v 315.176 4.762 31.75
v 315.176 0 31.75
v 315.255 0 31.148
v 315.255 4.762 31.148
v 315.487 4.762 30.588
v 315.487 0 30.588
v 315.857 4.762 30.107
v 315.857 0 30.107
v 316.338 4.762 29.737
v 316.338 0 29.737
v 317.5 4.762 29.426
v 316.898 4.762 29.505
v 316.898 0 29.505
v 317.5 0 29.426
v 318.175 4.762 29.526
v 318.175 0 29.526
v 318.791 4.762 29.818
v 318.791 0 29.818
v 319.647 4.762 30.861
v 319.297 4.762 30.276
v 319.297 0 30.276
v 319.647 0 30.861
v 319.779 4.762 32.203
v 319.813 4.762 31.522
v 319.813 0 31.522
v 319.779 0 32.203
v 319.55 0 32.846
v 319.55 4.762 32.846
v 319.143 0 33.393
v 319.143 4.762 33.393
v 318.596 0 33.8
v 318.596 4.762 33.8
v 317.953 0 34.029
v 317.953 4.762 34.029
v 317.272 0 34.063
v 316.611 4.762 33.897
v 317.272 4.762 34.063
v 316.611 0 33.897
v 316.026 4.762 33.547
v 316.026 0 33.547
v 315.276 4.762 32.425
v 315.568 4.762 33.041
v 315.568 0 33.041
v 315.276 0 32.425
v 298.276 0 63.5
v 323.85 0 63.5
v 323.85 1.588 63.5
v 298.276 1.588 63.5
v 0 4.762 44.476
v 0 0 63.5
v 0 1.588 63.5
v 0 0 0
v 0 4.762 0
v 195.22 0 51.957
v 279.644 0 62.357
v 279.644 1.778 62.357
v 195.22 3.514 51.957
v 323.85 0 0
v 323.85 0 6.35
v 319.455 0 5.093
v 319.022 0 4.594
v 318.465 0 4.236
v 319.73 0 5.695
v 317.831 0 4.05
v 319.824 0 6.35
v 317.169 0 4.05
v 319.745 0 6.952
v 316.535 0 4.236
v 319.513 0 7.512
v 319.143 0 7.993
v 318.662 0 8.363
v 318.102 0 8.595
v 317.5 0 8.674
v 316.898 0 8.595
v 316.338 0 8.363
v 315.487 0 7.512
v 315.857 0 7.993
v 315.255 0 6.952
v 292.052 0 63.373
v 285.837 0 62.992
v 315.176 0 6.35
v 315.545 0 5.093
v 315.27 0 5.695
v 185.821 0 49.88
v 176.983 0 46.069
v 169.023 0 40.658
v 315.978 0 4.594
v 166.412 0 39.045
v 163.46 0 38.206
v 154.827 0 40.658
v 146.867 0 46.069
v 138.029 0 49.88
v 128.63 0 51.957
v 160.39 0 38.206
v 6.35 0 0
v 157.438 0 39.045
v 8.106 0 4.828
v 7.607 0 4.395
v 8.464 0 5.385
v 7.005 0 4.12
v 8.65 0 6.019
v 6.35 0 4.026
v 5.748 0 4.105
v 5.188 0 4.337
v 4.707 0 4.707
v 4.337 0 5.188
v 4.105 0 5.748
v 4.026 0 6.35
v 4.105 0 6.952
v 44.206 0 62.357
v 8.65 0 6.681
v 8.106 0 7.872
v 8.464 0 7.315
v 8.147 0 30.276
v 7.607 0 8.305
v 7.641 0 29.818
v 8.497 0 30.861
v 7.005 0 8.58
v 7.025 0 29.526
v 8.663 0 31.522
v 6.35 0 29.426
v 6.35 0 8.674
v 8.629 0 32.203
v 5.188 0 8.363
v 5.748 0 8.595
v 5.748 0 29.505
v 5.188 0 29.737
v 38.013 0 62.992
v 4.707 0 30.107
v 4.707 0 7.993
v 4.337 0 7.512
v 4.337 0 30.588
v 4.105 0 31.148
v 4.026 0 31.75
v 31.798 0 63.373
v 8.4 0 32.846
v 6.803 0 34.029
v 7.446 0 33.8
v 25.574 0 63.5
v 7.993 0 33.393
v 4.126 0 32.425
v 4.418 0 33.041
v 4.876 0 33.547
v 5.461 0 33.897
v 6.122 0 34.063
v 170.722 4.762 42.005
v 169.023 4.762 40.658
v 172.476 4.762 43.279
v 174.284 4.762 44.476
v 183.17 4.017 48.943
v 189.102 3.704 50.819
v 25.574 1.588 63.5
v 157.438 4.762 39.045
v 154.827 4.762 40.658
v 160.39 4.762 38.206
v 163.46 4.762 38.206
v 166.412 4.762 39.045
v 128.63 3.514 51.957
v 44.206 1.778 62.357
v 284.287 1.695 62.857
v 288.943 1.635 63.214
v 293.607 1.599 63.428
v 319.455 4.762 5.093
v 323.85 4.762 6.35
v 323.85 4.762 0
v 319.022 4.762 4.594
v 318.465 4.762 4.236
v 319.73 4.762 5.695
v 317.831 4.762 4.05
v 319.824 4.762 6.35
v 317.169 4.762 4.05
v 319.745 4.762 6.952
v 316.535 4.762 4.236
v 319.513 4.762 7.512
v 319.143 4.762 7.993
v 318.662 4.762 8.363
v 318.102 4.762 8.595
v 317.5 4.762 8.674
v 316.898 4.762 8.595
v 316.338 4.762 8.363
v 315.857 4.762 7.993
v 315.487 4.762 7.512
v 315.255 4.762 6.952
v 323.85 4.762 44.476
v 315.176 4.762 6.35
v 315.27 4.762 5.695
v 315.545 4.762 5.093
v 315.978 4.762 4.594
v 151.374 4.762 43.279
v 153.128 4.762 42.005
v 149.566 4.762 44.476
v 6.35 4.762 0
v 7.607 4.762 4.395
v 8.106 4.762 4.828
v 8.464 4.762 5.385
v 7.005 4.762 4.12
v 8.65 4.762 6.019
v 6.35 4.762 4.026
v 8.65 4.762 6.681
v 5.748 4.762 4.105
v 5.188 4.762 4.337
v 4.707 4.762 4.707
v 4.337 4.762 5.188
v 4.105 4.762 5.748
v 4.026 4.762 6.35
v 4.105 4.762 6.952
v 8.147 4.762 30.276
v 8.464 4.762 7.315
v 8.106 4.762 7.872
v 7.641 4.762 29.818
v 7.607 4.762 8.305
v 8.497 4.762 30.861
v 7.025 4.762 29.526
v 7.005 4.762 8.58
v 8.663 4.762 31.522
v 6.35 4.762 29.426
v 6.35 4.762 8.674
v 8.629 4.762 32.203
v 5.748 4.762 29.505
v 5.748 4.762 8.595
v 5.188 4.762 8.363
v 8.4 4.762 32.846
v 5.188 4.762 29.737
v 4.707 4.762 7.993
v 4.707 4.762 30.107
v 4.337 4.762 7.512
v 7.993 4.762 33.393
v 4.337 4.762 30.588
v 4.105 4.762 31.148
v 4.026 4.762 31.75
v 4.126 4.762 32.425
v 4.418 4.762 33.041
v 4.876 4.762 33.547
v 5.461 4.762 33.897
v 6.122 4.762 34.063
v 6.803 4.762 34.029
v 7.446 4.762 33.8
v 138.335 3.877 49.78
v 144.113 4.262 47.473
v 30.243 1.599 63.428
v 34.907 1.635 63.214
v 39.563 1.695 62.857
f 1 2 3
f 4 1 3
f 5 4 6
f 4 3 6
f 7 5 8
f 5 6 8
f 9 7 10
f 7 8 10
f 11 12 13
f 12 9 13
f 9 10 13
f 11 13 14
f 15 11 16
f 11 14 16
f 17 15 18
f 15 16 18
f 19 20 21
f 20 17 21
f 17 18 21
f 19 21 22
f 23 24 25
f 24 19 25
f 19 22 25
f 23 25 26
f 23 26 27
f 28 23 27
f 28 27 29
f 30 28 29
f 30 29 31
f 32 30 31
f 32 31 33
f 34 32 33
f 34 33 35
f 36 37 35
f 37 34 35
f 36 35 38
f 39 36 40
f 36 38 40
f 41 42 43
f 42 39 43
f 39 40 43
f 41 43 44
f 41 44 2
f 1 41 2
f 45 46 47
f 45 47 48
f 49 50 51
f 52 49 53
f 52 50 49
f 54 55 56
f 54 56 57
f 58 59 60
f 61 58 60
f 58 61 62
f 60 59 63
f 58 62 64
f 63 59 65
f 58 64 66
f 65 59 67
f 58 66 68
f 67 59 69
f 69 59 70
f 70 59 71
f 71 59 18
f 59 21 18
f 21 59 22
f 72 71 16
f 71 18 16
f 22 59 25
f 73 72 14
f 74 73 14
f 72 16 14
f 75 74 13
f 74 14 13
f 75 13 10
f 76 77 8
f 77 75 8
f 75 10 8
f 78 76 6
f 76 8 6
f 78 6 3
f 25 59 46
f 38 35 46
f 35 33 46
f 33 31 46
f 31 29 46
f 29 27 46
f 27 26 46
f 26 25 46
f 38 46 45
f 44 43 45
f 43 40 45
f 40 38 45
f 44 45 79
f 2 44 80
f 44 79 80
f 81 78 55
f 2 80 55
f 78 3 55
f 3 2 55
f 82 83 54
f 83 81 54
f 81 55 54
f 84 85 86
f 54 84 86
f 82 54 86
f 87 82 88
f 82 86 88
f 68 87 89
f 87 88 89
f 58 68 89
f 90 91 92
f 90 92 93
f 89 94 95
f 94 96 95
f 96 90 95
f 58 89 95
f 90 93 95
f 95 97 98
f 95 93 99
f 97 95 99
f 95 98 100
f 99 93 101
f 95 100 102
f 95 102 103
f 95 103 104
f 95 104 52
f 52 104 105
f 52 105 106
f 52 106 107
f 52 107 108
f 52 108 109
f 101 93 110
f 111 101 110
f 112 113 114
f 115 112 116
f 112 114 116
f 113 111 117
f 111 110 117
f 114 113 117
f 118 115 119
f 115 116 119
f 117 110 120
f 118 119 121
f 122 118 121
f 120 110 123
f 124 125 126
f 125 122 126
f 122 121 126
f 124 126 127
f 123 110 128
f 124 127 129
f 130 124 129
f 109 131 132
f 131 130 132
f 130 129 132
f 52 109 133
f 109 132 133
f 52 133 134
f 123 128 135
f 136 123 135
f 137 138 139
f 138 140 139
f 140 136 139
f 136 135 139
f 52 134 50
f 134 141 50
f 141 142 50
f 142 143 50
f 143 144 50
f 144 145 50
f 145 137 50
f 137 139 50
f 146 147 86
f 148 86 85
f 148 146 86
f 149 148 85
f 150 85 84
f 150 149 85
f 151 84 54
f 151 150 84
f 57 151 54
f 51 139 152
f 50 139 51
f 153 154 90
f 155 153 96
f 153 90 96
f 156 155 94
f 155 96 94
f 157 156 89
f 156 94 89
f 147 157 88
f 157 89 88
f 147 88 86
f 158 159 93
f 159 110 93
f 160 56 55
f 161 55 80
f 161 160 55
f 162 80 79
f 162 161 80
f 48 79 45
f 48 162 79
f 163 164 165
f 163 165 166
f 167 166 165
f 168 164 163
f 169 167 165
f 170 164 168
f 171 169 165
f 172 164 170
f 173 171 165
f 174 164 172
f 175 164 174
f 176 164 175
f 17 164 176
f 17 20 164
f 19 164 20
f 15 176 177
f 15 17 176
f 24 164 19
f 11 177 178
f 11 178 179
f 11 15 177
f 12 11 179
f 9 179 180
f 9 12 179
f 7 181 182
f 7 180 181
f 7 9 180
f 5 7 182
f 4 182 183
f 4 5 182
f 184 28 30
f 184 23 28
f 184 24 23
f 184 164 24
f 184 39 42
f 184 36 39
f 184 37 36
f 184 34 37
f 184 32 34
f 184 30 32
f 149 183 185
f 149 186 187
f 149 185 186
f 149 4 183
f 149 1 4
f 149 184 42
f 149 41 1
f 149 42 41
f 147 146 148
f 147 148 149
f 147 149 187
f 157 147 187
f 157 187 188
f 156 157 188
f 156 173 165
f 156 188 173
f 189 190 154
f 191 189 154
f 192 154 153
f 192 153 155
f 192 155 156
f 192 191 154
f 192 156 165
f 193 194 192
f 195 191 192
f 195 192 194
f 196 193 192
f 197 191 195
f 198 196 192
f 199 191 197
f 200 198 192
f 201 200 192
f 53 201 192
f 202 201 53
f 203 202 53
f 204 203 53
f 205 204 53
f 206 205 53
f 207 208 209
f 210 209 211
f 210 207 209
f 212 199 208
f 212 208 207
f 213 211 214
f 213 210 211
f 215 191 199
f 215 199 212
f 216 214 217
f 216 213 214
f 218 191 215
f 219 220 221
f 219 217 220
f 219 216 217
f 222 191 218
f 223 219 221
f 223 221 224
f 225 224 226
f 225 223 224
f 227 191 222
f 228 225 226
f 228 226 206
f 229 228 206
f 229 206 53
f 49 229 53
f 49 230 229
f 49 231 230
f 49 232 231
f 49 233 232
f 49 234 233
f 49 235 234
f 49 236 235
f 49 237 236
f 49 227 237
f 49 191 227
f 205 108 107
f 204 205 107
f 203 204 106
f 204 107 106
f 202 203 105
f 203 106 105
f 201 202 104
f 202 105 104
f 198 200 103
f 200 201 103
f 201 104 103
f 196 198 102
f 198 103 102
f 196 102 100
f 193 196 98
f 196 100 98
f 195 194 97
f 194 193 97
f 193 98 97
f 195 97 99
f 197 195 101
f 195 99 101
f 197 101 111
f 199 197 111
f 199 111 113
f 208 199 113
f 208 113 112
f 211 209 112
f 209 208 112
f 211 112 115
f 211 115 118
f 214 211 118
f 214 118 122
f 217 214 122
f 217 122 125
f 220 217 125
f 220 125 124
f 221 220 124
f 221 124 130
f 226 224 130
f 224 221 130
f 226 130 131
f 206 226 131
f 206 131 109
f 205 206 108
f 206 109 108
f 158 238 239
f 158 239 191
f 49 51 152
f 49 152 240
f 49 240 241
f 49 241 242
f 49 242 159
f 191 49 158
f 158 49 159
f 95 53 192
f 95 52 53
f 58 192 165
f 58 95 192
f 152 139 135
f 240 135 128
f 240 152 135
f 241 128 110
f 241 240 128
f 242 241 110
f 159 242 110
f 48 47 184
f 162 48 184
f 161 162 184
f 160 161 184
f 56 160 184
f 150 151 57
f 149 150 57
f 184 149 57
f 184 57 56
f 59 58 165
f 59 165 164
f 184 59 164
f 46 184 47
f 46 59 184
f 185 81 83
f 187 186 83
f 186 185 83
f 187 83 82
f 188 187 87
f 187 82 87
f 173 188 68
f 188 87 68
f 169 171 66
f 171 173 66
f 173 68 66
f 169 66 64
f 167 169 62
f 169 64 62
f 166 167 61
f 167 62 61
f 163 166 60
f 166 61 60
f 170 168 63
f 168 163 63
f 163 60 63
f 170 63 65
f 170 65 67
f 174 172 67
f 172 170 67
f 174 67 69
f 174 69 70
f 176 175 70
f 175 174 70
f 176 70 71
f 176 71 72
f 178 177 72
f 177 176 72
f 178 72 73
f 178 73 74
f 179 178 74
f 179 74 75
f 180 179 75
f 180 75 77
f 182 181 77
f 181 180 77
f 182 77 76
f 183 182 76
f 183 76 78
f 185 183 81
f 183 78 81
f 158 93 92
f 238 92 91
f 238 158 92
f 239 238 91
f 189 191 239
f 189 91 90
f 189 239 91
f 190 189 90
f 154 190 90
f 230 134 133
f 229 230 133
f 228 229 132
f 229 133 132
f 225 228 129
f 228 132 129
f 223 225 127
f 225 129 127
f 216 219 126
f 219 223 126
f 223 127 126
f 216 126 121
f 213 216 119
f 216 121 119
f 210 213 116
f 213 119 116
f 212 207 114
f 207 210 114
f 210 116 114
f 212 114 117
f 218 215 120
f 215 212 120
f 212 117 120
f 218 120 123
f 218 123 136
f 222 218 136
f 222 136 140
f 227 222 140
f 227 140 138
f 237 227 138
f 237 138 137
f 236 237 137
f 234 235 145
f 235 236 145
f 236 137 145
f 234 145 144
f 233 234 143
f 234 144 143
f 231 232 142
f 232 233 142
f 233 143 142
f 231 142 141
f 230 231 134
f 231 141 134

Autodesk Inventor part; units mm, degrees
ref_plane "YZ Plane" through (0, 0, 0) normal (1, 0, 0) x (0, 1, 0)
ref_plane "XZ Plane" through (0, 0, 0) normal (0, 1, 0) x (-1, 0, 0)
ref_plane "XY Plane" through (0, 0, 0) normal (0, 0, 1) x (1, 0, 0)
sketch "Sketch1" plane through (0, 0, 0) normal (0, 1, 0) x (-1, 0, 0)
  line L0 (0, 0) -> (-323.85, 0)
  line L1 (-323.85, 0) -> (-323.85, 63.5)
  line L2 (-323.85, 63.5) -> (0, 63.5)
  line L3 (0, 63.5) -> (0, 0)
  line L4 (-323.85, 0) -> (-323.85, 6.35)
  line L5 (0, 0) -> (-6.35, 0)
  line L6 (-323.85, 0) -> (-317.5, 0)
  line L7 (-323.85, 6.35) -> (-317.5, 6.35)
  line L8 (-317.5, 6.35) -> (-317.5, 31.75)
  line L9 (-6.35, 0) -> (-6.35, 6.35)
  line L10 (-6.35, 6.35) -> (-6.35, 31.75)
  circle A0 centre (-6.35, 6.35) radius 2.3241
  circle A1 centre (-6.35, 31.75) radius 2.3241
  circle A2 centre (-317.5, 31.75) radius 2.3241
  circle A3 centre (-317.5, 6.35) radius 2.3241
  line L11 (-161.925, 0) -> (-161.925, 38.1)
  line L12 (-161.925, 63.5) -> (-288.925, 63.5)
  line L13 (-161.925, 63.5) -> (-34.925, 63.5)
  line L14 (-161.925, 63.5) -> (-161.925, 38.1)
  line L15 (-161.925, 63.5) -> (-161.925, 57.15)
  circle A4 centre (-161.925, 63.5) radius 9.525
  circle A5 centre (-161.925, 49.2261) radius 11.1261
  line L16 (-288.925, 63.5) -> (-171.45, 43.4759)
  line L17 (-34.925, 63.5) -> (-152.4, 43.4759)
  line L18 (-288.925, 63.5) -> (-173.0511, 49.2261)
  line L19 (-34.925, 63.5) -> (-150.7989, 49.2261)
  dimension "d0" = 323.85
  dimension "d1" = 63.5
  dimension "d2" = 6.35
  dimension "d3" = 6.35
  dimension "d4" = 6.35
  dimension "d5" = 25.4
  dimension "d6" = 6.35
  dimension "d7" = 25.4
  dimension "d8" = 4.6482
  dimension "d9" = 4.6482
  dimension "d10" = 4.6482
  dimension "d11" = 4.6482
  dimension "d12" = 38.1
  dimension "d13" = 127
  dimension "d14" = 127
  dimension "d15" = 6.35
  dimension "d16" = 19.05
extrude "Extrusion1" add sketch "Sketch1" along normal blind 4.7625 contours L0 L11 A5 L17 L2 L3 | L0 L1 L2 L16 A5 L11
extrude "Extrusion2" add sketch "Sketch1" along normal blind 4.7625 contours L17 A5 L19 | L16 L18 A5
fillet "Fillet1" radius 50.8 2 edges at (173.0511, 2.3813, 49.2261) (150.7989, 2.3813, 49.2261)
fillet "Fillet2" radius 152.4 2 edges at (288.925, 2.3813, 63.5) (34.925, 2.3813, 63.5)
sketch "Sketch2" plane through (0, 0, 0) normal (-1, 0, 0) x (0, 0, 1)
  line L0 (63.5, 0) -> (63.5, 4.7625) projected
  line L1 (63.5, 0) -> (63.5, 1.5875)
  line L2 (63.5, 1.5875) -> (50.4087, 4.7625)
  line L3 (0, 4.7625) -> (63.5, 4.7625) projected
  line L4 (63.5, 4.7625) -> (50.4087, 4.7625)
  line L5 (63.5, 1.5875) -> (63.5, 4.7625)
  line L6 (63.5, 1.5875) -> (44.4761, 4.7625)
  line L7 (44.4761, 4.7625) -> (50.4087, 4.7625)
  point P0 (0, 0)
  dimension "d24" = 1.5875
extrude "Extrusion3" cut sketch "Sketch2" against normal through all
properties part number "lady brown aligner"
